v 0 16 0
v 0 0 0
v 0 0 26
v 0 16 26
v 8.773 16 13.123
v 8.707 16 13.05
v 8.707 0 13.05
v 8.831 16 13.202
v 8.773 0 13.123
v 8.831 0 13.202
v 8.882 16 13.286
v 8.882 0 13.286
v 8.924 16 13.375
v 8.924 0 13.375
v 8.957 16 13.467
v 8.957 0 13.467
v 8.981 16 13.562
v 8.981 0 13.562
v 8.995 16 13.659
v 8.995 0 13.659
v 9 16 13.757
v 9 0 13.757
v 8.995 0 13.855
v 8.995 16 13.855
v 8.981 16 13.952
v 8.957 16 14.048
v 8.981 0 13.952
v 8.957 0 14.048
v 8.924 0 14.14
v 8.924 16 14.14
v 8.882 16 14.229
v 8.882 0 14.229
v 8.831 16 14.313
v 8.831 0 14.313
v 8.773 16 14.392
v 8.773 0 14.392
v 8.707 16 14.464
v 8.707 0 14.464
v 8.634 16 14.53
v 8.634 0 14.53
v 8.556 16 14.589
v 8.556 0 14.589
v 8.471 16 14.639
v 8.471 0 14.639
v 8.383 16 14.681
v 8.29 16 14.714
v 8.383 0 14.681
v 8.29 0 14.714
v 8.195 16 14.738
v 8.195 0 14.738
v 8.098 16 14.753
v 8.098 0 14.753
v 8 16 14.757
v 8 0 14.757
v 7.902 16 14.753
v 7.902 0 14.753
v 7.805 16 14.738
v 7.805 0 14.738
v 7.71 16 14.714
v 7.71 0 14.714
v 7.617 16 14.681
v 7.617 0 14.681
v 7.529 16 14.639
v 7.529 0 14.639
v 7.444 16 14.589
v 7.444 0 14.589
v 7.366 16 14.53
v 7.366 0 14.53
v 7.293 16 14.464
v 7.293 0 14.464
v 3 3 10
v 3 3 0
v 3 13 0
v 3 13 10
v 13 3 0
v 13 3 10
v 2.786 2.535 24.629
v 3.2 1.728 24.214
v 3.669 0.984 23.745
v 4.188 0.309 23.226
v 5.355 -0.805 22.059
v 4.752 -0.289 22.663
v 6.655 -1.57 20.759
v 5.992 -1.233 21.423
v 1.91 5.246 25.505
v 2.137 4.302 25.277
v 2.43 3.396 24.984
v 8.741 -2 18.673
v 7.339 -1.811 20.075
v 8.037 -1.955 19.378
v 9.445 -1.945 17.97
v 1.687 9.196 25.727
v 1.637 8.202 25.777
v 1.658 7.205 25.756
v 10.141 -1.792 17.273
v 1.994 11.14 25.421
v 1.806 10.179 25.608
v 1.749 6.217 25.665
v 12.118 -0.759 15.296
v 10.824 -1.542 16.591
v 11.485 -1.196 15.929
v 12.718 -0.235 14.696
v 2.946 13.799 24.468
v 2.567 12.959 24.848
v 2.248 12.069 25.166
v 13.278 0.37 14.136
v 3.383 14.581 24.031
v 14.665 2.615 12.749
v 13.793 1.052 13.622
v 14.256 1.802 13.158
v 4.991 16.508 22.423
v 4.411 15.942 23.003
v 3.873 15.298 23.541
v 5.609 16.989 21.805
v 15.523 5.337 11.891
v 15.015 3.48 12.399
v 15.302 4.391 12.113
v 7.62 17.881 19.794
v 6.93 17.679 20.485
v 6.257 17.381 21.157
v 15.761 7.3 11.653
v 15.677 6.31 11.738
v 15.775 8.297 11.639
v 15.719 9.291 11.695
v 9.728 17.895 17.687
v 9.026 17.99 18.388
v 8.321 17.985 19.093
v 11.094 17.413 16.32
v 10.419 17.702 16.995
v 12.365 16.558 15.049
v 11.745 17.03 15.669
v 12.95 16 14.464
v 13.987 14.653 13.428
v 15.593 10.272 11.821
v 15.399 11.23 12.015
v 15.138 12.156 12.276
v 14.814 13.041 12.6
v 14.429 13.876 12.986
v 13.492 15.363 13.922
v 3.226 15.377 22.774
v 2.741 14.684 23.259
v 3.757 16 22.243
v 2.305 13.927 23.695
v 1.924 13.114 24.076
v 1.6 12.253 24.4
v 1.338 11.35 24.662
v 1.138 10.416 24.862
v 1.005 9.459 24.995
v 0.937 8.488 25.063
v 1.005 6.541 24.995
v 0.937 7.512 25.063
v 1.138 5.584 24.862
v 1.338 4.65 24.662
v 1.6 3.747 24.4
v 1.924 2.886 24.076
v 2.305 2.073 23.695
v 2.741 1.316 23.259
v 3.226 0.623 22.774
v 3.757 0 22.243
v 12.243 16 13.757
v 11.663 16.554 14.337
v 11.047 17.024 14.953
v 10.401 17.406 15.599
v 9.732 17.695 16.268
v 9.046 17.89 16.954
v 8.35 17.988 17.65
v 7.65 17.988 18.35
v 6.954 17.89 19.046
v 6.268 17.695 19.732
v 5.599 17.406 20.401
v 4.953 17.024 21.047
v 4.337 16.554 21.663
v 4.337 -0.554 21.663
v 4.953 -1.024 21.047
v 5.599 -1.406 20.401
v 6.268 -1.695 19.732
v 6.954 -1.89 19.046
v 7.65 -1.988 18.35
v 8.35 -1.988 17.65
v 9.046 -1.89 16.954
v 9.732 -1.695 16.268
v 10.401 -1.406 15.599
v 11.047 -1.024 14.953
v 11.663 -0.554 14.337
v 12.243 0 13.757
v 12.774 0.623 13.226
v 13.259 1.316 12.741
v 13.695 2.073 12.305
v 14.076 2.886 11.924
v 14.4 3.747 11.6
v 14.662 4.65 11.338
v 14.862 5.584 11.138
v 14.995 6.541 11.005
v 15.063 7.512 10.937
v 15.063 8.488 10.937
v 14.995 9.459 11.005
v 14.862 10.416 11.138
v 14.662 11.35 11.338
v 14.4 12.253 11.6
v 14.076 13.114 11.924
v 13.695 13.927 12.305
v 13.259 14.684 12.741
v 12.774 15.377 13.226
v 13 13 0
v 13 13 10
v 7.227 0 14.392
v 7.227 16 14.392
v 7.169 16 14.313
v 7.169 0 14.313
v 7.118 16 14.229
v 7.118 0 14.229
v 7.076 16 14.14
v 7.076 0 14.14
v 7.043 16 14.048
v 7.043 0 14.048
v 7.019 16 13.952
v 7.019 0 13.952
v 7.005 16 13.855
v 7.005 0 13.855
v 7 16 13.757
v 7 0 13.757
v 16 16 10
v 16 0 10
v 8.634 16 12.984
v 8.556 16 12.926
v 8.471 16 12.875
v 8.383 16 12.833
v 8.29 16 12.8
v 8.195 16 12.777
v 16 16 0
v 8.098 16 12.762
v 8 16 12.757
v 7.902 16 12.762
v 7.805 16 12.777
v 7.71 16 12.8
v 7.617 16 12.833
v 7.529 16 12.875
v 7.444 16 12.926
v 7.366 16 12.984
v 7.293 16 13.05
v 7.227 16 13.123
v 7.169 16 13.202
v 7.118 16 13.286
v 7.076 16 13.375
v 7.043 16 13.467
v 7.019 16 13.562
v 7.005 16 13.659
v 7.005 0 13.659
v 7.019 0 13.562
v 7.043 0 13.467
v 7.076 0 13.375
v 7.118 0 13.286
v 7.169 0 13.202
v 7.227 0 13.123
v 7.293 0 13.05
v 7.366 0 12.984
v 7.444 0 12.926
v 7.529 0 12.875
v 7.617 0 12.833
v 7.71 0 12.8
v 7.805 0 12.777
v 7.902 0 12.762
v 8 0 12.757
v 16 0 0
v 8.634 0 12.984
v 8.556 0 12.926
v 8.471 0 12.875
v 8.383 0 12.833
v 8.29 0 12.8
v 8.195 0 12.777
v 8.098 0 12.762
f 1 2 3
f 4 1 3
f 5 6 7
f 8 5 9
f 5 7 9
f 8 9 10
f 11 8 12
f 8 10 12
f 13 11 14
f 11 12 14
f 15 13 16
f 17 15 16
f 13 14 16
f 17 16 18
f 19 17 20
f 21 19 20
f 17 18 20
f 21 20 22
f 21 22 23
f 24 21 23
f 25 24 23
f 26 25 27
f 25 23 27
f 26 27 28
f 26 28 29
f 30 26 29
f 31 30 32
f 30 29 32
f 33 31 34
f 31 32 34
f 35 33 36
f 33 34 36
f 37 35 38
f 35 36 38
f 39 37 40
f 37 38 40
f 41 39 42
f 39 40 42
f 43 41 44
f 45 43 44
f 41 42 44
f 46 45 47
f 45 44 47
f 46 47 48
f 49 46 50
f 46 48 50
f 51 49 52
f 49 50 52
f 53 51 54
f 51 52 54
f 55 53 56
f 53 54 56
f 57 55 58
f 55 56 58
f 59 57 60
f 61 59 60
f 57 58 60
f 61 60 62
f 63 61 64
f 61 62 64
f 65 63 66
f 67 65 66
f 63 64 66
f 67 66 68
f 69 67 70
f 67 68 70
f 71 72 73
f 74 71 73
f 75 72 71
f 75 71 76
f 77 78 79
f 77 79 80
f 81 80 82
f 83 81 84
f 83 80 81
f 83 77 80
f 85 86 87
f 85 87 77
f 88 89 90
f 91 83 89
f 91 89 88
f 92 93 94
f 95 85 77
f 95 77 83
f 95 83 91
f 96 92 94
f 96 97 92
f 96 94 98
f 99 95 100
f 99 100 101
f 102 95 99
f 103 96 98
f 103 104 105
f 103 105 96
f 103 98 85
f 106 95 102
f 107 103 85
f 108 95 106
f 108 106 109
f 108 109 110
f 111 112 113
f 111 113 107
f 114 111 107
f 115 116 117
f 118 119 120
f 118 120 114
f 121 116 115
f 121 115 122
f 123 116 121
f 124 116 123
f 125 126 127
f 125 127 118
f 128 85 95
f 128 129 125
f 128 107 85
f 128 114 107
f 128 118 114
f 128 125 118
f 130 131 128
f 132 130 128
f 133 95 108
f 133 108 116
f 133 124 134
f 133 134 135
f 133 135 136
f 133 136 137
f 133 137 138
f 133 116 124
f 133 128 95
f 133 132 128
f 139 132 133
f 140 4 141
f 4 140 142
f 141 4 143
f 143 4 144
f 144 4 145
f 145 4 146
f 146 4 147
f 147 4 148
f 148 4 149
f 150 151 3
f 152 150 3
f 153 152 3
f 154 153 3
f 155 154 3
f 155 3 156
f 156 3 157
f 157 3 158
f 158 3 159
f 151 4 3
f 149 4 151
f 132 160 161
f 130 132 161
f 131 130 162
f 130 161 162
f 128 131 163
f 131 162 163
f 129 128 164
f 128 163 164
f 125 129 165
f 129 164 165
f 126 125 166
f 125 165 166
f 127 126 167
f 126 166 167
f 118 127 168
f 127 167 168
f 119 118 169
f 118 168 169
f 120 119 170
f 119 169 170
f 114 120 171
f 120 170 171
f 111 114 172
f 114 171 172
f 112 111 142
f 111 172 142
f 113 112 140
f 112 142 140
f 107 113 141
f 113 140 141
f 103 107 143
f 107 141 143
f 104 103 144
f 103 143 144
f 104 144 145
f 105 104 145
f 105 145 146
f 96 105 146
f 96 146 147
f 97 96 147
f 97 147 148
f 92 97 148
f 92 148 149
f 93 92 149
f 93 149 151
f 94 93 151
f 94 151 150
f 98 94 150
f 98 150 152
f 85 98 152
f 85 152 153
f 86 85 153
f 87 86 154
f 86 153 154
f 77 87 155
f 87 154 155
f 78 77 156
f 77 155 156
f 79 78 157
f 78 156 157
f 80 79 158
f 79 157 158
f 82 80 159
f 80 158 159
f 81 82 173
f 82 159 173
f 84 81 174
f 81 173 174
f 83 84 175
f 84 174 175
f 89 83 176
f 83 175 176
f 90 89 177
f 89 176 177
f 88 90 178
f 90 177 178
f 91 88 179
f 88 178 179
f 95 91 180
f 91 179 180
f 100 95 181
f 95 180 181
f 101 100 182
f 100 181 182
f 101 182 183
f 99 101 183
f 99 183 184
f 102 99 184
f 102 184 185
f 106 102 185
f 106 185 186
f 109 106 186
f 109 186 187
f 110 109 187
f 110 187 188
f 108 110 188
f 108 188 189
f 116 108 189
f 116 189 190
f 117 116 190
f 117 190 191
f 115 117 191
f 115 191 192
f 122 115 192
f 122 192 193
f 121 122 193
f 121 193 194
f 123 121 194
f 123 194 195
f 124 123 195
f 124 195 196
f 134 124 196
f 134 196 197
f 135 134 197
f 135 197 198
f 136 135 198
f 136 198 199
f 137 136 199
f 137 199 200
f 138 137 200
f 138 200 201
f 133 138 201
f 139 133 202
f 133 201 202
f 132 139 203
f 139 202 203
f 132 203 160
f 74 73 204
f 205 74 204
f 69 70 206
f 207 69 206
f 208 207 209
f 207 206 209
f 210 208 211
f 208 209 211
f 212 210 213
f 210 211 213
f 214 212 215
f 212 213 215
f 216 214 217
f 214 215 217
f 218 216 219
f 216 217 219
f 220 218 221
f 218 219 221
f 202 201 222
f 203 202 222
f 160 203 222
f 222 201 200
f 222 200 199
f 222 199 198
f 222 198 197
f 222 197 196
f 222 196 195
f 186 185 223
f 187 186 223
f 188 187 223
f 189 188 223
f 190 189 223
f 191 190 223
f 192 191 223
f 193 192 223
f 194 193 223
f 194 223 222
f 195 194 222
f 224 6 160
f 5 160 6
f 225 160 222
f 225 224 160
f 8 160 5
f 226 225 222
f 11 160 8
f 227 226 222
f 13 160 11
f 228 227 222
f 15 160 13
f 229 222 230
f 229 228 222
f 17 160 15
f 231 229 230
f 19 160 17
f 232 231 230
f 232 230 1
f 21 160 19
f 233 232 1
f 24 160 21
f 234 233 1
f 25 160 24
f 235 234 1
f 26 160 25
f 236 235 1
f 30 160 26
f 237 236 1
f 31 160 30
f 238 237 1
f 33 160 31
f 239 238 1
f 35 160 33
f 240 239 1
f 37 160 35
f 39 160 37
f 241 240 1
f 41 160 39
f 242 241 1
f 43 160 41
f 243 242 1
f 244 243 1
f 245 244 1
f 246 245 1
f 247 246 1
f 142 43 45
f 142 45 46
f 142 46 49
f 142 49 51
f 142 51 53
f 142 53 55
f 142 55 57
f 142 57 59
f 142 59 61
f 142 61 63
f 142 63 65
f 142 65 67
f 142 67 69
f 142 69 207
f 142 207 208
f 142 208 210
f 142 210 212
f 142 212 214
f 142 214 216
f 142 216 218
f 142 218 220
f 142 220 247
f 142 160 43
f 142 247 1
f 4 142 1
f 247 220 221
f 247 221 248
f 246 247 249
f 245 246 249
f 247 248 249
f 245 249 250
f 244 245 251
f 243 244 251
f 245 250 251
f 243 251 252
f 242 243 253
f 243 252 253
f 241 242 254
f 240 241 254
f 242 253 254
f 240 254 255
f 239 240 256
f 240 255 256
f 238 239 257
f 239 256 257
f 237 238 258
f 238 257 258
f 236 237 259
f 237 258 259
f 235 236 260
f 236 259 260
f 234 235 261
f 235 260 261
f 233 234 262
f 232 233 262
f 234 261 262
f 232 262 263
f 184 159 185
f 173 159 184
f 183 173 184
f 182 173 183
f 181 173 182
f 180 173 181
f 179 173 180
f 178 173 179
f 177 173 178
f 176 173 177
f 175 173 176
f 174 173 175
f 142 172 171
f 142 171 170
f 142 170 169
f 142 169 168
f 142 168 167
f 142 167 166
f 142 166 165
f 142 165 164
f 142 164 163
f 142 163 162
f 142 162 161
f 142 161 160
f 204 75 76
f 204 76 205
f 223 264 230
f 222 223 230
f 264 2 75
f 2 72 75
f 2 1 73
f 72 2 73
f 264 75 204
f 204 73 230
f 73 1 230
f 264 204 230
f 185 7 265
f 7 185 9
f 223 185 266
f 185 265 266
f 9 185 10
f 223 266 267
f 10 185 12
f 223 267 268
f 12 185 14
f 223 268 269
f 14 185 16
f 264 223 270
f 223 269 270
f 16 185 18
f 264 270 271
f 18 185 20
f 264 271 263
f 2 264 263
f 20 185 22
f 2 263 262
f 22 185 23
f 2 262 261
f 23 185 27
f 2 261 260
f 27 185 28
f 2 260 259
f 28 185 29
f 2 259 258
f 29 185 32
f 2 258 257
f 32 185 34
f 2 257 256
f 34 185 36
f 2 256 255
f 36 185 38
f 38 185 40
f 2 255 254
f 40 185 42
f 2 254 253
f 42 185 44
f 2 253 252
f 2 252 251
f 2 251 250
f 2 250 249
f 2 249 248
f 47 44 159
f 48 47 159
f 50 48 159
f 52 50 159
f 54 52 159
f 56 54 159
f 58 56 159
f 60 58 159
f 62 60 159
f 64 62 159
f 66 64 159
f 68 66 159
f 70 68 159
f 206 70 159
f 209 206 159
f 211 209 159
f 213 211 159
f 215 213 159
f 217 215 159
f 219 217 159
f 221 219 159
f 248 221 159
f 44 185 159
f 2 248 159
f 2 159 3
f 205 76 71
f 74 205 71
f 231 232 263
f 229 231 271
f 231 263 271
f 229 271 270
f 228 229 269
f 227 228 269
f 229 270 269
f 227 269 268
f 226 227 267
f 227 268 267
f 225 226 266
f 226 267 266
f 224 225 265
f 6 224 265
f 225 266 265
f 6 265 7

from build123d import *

# Parameters (mm, degrees)
SKETCH_1_W          = 16
SKETCH_1_H          = 16
SKETCH_1_W_2        = 10
SKETCH_1_H_2        = 10
EXTRUDE_1_DEPTH     = 10
EXTRUDE_2_DEPTH     = 16
EXTRUDE_3_DEPTH     = 1
CUT_EXTRUDE_3_DEPTH = 16


with BuildPart() as part:
    # 草图1 → 凸台-拉伸1 (new body)
    with BuildSketch(Plane.XY):
        with Locations((8, 8)):
            Rectangle(SKETCH_1_W, SKETCH_1_H)
        with Locations((8, 8)):
            Rectangle(SKETCH_1_W_2, SKETCH_1_H_2, mode=Mode.SUBTRACT)
    extrude(amount=EXTRUDE_1_DEPTH)

    # 草图2 → 凸台-拉伸2 (add)
    with BuildSketch(Plane.XZ):
        Polygon((0, 10), (0, 26), (16, 10), align=None)
    extrude(amount=-EXTRUDE_2_DEPTH)

    # 草图6 → 凸台-拉伸3 (add)
    with BuildSketch(Plane(origin=(13, 0, 13), x_dir=(0.7071067811865475, 0, -0.7071067811865477), z_dir=(0.7071067811865477, 0, 0.7071067811865475))):
        with BuildLine():
            Line((-13.071067812, 0), (-7.071067812, 0))
            Line((-7.071067812, 0), (-7.071067812, 16))
            Line((-7.071067812, 16), (-13.071067812, 16))
            ThreePointArc((-13.071067812, 16), (-17.071067812, 8), (-13.071067812, 0))
        make_face()
        with BuildLine():
            Line((-7.071067812, 16), (-7.071067812, 0))
            Line((-7.071067812, 0), (-1.071067812, 0))
            ThreePointArc((-1.071067812, 0), (1.873204098, 3.527864045), (2.928932188, 8))
            ThreePointArc((2.928932188, 8), (1.873204098, 12.472135955), (-1.071067812, 16))
            Line((-1.071067812, 16), (-7.071067812, 16))
        make_face()
        with BuildLine():
            Line((-1.071067812, 0), (-7.071067812, 0))
            Line((-7.071067812, 0), (-13.071067812, 0))
            ThreePointArc((-13.071067812, 0), (-7.071067812, -2), (-1.071067812, 0))
        make_face()
        with BuildLine():
            Line((-13.071067812, 16), (-7.071067812, 16))
            Line((-7.071067812, 16), (-1.071067812, 16))
            ThreePointArc((-1.071067812, 16), (-7.071067812, 18), (-13.071067812, 16))
        make_face()
    extrude(amount=EXTRUDE_3_DEPTH)

    # 草图9 → 切除-拉伸3 (cut)
    with BuildSketch(Plane(origin=(0, 0, 0), x_dir=(-1, 0, 0), z_dir=(0, -1, 0))):
        with BuildLine():
            Line((-8, -13.757359313), (-7.292893219, -14.464466094))
            ThreePointArc((-7.292893219, -14.464466094), (-7.076120467, -14.140042745), (-7, -13.757359313))
            ThreePointArc((-7, -13.757359313), (-7.292893219, -13.050252532), (-8, -12.757359313))
            Line((-8, -12.757359313), (-8, -13.757359313))
        make_face()
        with BuildLine():
            Line((-8.707106781, -13.050252532), (-8, -13.757359313))
            Line((-8, -13.757359313), (-8, -12.757359313))
            ThreePointArc((-8, -12.757359313), (-8.382683432, -12.83347978), (-8.707106781, -13.050252532))
        make_face()
        with BuildLine():
            ThreePointArc((-8.707106781, -13.050252532), (-8.707106781, -14.464466094), (-7.292893219, -14.464466094))
            Line((-7.292893219, -14.464466094), (-8, -13.757359313))
            Line((-8, -13.757359313), (-8.707106781, -13.050252532))
        make_face()
    extrude(amount=-CUT_EXTRUDE_3_DEPTH, mode=Mode.SUBTRACT)


solid = part.part
